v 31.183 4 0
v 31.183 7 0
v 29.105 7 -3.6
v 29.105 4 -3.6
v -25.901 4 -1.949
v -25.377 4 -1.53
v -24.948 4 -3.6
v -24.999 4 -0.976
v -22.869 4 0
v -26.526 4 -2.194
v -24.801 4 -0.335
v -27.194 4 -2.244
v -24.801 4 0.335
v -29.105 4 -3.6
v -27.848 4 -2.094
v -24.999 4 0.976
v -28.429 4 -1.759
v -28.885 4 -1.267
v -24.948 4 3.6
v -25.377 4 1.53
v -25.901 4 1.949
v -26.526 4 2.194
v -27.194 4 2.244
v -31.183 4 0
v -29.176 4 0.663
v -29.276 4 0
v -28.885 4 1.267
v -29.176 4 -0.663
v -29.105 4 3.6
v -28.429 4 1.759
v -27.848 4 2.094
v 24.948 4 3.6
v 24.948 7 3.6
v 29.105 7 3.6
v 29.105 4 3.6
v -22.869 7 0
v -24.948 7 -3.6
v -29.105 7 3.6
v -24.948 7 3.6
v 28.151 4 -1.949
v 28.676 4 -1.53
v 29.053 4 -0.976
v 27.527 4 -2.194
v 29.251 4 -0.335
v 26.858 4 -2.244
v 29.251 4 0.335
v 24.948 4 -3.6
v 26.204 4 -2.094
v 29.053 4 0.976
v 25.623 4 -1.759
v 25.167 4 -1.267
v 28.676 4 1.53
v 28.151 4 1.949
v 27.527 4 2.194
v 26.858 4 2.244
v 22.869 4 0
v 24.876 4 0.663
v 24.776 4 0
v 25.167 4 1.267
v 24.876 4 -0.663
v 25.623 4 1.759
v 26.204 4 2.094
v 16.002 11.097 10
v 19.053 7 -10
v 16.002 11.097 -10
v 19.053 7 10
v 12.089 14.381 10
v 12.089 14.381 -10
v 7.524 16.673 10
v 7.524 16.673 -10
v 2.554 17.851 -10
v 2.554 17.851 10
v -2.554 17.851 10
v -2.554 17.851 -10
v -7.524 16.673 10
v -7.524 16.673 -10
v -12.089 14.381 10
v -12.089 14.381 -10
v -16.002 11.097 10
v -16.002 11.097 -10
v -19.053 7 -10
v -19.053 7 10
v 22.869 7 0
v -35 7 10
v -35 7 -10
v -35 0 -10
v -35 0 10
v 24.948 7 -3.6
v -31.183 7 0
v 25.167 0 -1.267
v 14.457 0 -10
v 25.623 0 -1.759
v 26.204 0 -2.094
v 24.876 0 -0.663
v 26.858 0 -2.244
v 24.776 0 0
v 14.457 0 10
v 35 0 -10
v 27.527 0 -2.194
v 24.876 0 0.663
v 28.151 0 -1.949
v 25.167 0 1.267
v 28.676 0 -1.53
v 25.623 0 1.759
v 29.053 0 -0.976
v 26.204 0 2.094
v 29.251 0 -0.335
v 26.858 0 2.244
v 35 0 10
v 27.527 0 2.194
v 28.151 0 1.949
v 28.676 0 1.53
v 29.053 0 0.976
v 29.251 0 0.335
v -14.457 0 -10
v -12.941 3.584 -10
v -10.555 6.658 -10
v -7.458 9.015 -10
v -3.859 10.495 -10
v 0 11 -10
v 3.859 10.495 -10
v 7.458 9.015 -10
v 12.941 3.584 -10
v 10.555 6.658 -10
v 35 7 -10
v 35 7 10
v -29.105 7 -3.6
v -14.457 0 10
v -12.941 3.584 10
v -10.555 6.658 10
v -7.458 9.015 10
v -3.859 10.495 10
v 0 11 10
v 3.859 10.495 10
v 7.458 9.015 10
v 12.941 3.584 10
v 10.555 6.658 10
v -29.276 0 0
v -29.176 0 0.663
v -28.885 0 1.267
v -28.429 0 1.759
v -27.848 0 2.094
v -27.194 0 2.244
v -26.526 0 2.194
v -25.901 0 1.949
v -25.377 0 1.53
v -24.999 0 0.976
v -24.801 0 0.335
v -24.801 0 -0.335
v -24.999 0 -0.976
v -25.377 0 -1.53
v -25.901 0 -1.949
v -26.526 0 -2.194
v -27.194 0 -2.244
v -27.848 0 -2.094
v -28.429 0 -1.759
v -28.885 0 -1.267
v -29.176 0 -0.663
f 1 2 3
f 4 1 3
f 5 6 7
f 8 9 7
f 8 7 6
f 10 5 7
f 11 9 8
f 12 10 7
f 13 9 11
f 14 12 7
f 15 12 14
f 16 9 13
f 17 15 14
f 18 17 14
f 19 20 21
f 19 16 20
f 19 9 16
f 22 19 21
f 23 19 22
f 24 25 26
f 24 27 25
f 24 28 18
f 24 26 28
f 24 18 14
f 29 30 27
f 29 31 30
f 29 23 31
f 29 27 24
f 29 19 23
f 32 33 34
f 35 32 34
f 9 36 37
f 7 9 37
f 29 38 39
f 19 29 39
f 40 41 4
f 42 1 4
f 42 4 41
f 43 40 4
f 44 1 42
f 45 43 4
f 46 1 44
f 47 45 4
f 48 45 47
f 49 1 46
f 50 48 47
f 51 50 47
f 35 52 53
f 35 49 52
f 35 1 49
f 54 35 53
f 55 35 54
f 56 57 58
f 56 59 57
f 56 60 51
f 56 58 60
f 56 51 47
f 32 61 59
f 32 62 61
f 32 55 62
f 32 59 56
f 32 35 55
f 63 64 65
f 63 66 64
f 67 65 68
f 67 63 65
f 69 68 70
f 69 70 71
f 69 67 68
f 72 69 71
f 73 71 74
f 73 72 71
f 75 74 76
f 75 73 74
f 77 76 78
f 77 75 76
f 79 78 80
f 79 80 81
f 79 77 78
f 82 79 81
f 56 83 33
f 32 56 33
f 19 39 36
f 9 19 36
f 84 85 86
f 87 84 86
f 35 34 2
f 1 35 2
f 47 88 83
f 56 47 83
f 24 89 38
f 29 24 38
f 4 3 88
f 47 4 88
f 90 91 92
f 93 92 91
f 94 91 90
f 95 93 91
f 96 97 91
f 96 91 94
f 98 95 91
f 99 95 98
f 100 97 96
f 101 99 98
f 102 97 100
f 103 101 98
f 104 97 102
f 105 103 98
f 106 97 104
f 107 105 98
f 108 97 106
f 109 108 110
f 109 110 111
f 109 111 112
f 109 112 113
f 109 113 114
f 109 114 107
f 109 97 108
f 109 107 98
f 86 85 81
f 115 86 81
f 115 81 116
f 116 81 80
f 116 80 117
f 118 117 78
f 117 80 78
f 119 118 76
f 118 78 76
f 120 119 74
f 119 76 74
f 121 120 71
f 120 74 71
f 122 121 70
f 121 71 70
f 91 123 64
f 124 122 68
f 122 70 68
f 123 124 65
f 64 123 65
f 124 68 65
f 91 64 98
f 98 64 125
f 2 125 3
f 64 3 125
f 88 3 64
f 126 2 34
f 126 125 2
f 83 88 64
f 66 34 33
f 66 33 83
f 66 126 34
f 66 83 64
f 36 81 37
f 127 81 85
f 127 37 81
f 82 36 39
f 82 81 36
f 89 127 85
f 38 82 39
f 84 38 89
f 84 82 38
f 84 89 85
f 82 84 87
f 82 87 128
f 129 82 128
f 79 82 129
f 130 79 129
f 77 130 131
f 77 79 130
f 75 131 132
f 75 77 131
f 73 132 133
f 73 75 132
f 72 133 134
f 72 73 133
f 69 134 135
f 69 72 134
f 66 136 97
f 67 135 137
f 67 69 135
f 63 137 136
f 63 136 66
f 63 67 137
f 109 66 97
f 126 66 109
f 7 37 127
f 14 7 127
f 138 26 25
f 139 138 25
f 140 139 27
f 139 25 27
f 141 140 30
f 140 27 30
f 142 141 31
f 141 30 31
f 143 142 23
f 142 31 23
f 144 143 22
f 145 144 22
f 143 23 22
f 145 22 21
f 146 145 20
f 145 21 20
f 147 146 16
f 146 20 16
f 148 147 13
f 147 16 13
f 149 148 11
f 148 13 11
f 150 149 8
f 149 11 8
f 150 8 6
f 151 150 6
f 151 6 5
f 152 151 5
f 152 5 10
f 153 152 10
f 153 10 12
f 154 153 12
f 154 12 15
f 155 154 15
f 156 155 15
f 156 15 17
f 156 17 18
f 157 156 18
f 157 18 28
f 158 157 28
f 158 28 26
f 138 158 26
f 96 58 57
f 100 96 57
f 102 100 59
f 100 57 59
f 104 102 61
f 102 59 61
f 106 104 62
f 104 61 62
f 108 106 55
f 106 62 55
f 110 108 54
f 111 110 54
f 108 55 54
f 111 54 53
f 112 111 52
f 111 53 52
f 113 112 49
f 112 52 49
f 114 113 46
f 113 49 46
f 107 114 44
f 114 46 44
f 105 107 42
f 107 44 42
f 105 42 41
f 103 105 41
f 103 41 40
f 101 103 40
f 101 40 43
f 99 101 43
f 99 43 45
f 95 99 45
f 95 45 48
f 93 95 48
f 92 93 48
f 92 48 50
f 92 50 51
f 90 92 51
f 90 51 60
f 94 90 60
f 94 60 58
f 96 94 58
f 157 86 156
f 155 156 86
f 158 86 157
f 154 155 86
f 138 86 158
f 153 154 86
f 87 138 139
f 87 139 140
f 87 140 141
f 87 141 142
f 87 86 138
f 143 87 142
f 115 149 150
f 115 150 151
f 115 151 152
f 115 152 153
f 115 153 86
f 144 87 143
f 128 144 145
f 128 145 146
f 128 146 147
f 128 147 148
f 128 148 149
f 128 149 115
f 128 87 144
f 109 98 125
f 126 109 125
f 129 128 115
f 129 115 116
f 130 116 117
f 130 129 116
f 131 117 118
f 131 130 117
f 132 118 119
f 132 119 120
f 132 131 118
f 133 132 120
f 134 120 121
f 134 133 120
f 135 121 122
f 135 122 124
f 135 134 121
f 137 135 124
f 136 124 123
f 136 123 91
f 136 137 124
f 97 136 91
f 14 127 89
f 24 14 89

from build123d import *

# Parameters (mm, degrees)
F1_DEPTH = 10
F2_R     = 2.25
F3_DEPTH = 25
F4_R     = 2.25
F5_DEPTH = 3


with BuildPart() as f1:
    # F0 (on Top) → F1 (new body, symmetric)
    with BuildSketch(Plane.XY):
        with BuildLine():
            Line((-35, 7), (-35, 0))
            Line((-35, 0), (-14.456832, 0))
            ThreePointArc((-14.456832, 0), (0, 11), (14.456832, 0))
            Line((14.456832, 0), (35, 0))
            Line((35, 0), (35, 7))
            Line((35, 7), (19.052559, 7))
            ThreePointArc((19.052559, 7), (0, 18), (-19.052559, 7))
            Line((-19.052559, 7), (-35, 7))
        make_face()
    extrude(amount=F1_DEPTH, both=True)

    # F2 (on face) → F3 (cut)
    with BuildSketch(Plane(origin=(0, 7, 0), x_dir=(-1, 0, 0), z_dir=(0, 1, 0))):
        with Locations((-27.026279, 0)):
            Circle(F2_R)
        with Locations((27.026279, 0)):
            Circle(F2_R)
    extrude(amount=-F3_DEPTH, mode=Mode.SUBTRACT)

    # F4 (on face) → F5 (cut)
    with BuildSketch(Plane(origin=(0, 7, 0), x_dir=(-1, 0, 0), z_dir=(0, 1, 0))):
        Polygon((-29.10474, 3.6), (-31.183201, 0), (-29.10474, -3.6), (-24.947818, -3.6), (-22.869358, 0), (-24.947818, 3.6), align=None)
        with Locations((-27.026279, 0)):
            Circle(F4_R, mode=Mode.SUBTRACT)
        Polygon((29.10474, -3.6), (31.183201, 0), (29.10474, 3.6), (24.947818, 3.6), (22.869358, 0), (24.947818, -3.6), align=None)
    extrude(amount=-F5_DEPTH, mode=Mode.SUBTRACT)


solid = f1.part
